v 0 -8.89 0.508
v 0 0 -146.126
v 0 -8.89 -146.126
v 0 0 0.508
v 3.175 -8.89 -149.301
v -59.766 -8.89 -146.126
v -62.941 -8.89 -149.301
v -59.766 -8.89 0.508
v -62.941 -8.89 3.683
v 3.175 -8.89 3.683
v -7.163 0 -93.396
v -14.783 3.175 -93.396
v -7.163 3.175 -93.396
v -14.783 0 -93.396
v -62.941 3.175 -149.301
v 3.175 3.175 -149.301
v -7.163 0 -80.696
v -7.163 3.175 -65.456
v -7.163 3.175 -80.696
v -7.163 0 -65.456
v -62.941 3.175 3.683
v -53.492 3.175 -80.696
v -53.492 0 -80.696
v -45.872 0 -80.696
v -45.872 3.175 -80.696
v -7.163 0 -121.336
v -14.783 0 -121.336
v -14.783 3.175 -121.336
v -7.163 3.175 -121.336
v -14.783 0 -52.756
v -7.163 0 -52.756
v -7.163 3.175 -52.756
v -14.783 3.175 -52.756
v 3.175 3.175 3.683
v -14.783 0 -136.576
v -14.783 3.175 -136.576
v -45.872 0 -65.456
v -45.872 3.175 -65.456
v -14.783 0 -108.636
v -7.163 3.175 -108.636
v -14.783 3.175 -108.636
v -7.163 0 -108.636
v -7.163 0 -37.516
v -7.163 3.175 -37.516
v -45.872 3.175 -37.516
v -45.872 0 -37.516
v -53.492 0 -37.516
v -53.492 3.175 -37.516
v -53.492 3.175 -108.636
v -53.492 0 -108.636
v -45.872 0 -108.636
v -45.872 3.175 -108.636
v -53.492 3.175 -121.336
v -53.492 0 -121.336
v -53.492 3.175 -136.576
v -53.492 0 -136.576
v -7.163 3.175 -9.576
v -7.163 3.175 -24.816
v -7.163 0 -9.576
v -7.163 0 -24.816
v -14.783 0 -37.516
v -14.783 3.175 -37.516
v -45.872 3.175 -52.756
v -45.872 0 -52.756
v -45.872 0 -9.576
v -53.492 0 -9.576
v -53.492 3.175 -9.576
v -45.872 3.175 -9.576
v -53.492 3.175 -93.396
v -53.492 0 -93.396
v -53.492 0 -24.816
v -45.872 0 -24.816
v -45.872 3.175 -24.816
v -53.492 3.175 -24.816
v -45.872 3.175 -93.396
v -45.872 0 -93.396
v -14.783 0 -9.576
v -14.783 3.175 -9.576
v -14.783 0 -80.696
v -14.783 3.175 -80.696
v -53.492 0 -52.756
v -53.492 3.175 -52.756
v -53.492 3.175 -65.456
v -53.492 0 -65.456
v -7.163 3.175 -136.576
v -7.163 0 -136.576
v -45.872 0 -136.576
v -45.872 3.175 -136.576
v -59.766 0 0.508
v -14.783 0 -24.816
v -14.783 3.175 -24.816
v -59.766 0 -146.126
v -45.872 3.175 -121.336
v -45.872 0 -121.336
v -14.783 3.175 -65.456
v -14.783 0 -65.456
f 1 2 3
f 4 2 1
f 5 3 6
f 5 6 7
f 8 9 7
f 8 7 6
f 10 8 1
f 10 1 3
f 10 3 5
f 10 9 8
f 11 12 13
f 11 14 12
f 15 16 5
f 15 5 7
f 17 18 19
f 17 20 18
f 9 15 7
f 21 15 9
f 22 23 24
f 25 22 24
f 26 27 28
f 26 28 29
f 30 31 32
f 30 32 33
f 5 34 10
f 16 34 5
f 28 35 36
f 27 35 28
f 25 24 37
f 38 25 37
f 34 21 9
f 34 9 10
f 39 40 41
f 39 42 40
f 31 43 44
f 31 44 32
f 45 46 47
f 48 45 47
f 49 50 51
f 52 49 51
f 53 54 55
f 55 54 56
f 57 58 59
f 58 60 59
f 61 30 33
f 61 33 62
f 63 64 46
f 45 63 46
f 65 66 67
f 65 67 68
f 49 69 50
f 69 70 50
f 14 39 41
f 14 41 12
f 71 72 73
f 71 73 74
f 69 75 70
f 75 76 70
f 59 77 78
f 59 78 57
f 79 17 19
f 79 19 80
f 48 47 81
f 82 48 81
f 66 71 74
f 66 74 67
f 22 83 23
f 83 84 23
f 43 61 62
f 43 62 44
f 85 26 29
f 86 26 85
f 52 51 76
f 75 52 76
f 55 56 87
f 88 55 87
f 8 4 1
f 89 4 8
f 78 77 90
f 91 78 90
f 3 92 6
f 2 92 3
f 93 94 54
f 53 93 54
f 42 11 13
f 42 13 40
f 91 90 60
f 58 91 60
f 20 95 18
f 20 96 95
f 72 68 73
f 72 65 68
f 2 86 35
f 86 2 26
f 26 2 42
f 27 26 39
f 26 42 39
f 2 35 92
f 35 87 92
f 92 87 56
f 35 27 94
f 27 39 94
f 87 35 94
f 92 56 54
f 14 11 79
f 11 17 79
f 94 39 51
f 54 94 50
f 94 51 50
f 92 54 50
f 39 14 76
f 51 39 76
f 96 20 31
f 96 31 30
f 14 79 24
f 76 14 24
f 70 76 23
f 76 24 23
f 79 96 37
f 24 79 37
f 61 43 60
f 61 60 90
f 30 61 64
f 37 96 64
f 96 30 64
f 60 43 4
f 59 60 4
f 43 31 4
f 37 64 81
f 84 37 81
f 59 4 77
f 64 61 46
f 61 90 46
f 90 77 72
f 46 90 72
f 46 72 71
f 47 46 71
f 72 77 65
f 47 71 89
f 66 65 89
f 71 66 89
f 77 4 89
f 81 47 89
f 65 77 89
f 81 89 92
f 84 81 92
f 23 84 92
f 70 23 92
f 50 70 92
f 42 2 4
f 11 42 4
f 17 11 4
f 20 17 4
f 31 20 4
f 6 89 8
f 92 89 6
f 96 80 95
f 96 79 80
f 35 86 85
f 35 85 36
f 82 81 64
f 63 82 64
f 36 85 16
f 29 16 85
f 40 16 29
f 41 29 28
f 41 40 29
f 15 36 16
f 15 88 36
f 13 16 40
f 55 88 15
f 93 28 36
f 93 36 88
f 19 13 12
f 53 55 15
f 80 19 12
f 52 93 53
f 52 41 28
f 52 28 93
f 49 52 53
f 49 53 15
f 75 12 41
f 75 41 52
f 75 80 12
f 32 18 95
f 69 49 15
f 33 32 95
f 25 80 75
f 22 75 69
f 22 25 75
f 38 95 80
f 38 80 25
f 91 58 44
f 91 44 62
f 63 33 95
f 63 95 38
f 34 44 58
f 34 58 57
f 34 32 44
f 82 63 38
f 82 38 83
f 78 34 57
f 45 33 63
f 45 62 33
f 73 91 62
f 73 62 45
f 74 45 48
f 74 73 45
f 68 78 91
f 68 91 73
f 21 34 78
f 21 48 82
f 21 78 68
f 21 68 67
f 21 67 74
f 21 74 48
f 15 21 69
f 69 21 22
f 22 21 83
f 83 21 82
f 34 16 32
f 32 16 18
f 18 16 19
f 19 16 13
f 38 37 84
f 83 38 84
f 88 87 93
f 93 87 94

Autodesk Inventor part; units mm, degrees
ref_plane "YZ Plane" through (0, 0, 0) normal (1, 0, 0) x (0, 1, 0)
ref_plane "XZ Plane" through (0, 0, 0) normal (0, 1, 0) x (-1, 0, 0)
ref_plane "XY Plane" through (0, 0, 0) normal (0, 0, 1) x (1, 0, 0)
sketch "Sketch4" plane through (0, 0, 0) normal (0, 1, 0) x (-1, 0, 0)
  line L0 (0, 0) -> (59.7662, 0)
  line L1 (59.7662, 0) -> (59.7662, -146.1262)
  line L2 (59.7662, -146.1262) -> (0, -146.1262)
  line L3 (0, -146.1262) -> (0, 0)
  line L4 (59.7662, 0) -> (53.4924, 0)
  line L5 (53.4924, 0) -> (53.4924, -9.5758)
  line L6 (53.4924, -9.5758) -> (59.7662, -9.5758)
  line L7 (59.7662, -9.5758) -> (59.7662, 0)
  line L8 (53.4924, -9.5758) -> (45.8724, -9.5758)
  line L9 (45.8724, -9.5758) -> (45.8724, -24.8158)
  line L10 (45.8724, -24.8158) -> (53.4924, -24.8158)
  line L11 (53.4924, -24.8158) -> (53.4924, -9.5758)
  line L12 (45.8724, -24.8158) -> (45.8724, -37.5158)
  line L13 (45.8724, -37.5158) -> (53.4924, -37.5158)
  line L14 (53.4924, -37.5158) -> (53.4924, -52.7558)
  line L15 (53.4924, -52.7558) -> (45.8724, -52.7558)
  line L16 (45.8724, -52.7558) -> (45.8724, -37.5158)
  line L17 (45.8724, -52.7558) -> (45.8724, -65.4558)
  line L18 (45.8724, -65.4558) -> (53.4924, -65.4558)
  line L19 (53.4924, -65.4558) -> (53.4924, -80.6958)
  line L20 (53.4924, -80.6958) -> (45.8724, -80.6958)
  line L21 (45.8724, -80.6958) -> (45.8724, -65.4558)
  line L22 (45.8724, -80.6958) -> (45.8724, -93.3958)
  line L23 (45.8724, -93.3958) -> (53.4924, -93.3958)
  line L24 (53.4924, -93.3958) -> (53.4924, -108.6358)
  line L25 (53.4924, -108.6358) -> (45.8724, -108.6358)
  line L26 (45.8724, -108.6358) -> (45.8724, -93.3958)
  line L27 (45.8724, -108.6358) -> (45.8724, -121.3358)
  line L28 (45.8724, -121.3358) -> (53.4924, -121.3358)
  line L29 (53.4924, -121.3358) -> (53.4924, -136.5758)
  line L30 (53.4924, -136.5758) -> (45.8724, -136.5758)
  line L31 (45.8724, -136.5758) -> (45.8724, -121.3358)
  line L32 (0, 0) -> (7.1628, 0)
  line L33 (7.1628, 0) -> (7.1628, -9.5758)
  line L34 (7.1628, -9.5758) -> (0, -9.5758)
  line L35 (0, -9.5758) -> (0, 0)
  line L36 (53.4924, -9.5758) -> (7.1628, -9.5758)
  line L37 (30.3276, -9.5758) -> (30.3276, -4.7879)
  line L38 (7.1628, -9.5758) -> (14.7828, -9.5758)
  line L39 (14.7828, -9.5758) -> (14.7828, -24.8158)
  line L40 (14.7828, -24.8158) -> (7.1628, -24.8158)
  line L41 (7.1628, -24.8158) -> (7.1628, -9.5758)
  line L42 (14.7828, -37.5158) -> (7.1628, -37.5158)
  line L43 (7.1628, -37.5158) -> (7.1628, -52.7558)
  line L44 (7.1628, -52.7558) -> (14.7828, -52.7558)
  line L45 (14.7828, -52.7558) -> (14.7828, -37.5158)
  line L46 (14.7828, -65.4558) -> (7.1628, -65.4558)
  line L47 (7.1628, -65.4558) -> (7.1628, -80.6958)
  line L48 (7.1628, -80.6958) -> (14.7828, -80.6958)
  line L49 (14.7828, -80.6958) -> (14.7828, -65.4558)
  line L50 (14.7828, -93.3958) -> (7.1628, -93.3958)
  line L51 (7.1628, -93.3958) -> (7.1628, -108.6358)
  line L52 (7.1628, -108.6358) -> (14.7828, -108.6358)
  line L53 (14.7828, -108.6358) -> (14.7828, -93.3958)
  line L54 (14.7828, -121.3358) -> (7.1628, -121.3358)
  line L55 (7.1628, -121.3358) -> (7.1628, -136.5758)
  line L56 (7.1628, -136.5758) -> (14.7828, -136.5758)
  line L57 (14.7828, -136.5758) -> (14.7828, -121.3358)
  line L58 (7.1628, -9.5758) -> (53.4924, -9.5758)
  line L59 (0, 0) -> (0, -146.1262)
  line L60 (0, -146.1262) -> (59.7662, -146.1262)
  line L61 (59.7662, -146.1262) -> (59.7662, 0)
  line L62 (62.9412, 0) -> (62.9412, -149.3012)
  line L63 (62.9412, -149.3012) -> (-3.175, -149.3012)
  line L64 (-3.175, -149.3012) -> (-3.175, 0)
  line L65 (0, 0.508) -> (59.7662, 0.508)
  line L66 (0, 3.683) -> (59.7662, 3.683)
  line L67 (62.9412, 0) -> (59.7662, 0)
  line L68 (59.7662, 0) -> (59.7662, 3.683)
  line L69 (59.7662, 3.683) -> (62.9412, 3.683)
  line L70 (62.9412, 3.683) -> (62.9412, 0)
  line L71 (-3.175, 0) -> (0, 0)
  line L72 (0, 0) -> (0, 3.683)
  line L73 (0, 3.683) -> (-3.175, 3.683)
  line L74 (-3.175, 3.683) -> (-3.175, 0)
  line L75 (0, 0.508) -> (0, 0.508)
  line L76 (0, 0.508) -> (0, 0)
  line L77 (0, 0) -> (0, 0)
  line L78 (0, 0) -> (0, 0.508)
  line L79 (59.7662, 0.508) -> (59.7662, 0.508)
  line L80 (59.7662, 0.508) -> (59.7662, 0)
  line L81 (59.7662, 0) -> (59.7662, 0)
  line L82 (59.7662, 0) -> (59.7662, 0.508)
  point P0 (59.7662, 0)
  dimension "d503" = 59.7662
  dimension "d504" = 146.1262
  dimension "d505" = 6.2738
  dimension "d506" = 9.5758
  dimension "d507" = 7.62
  dimension "d508" = 15.24
  dimension "d509" = 12.7
  dimension "d510" = 7.62
  dimension "d511" = 15.24
  dimension "d512" = 12.7
  dimension "d513" = 7.62
  dimension "d514" = 15.24
  dimension "d515" = 12.7
  dimension "d516" = 7.62
  dimension "d517" = 15.24
  dimension "d518" = 12.7
  dimension "d519" = 7.62
  dimension "d520" = 15.24
  dimension "d521" = 7.1628
  dimension "d522" = 9.5758
  dimension "d529" = 3.175
  dimension "d530" = 0.508
  dimension "d531" = 3.175
extrude "Extrusion4" add sketch "Sketch4" along normal blind 3.175 contours L72 L65 L68 L0 | L0 L33 L34 L3 | L3 L2 L1 L67 L62 L63 L64 L71 | L71 L74 L73 L72 | L0 L5 L8 L36 L33 | L34 L41 L40 L39 L36 L9 L10 L11 L6 L1 L2 L3 | L72 L66 L68 L65 | L0 L1 L6 L5 | L68 L69 L70 L67
sketch "Sketch5" plane through (0, 0, 0) normal (0, -1, 0) x (1, 0, 0)
  line L0 (-7.1628, -9.5758) -> (-14.7828, -9.5758) projected
  line L1 (-7.1628, -24.8158) -> (-7.1628, -9.5758) projected
  line L2 (-14.7828, -24.8158) -> (-7.1628, -24.8158) projected
  line L3 (-14.7828, -9.5758) -> (-14.7828, -24.8158) projected
  line L4 (-53.4924, -9.5758) -> (-53.4924, -24.8158) projected
  line L5 (-45.8724, -9.5758) -> (-53.4924, -9.5758) projected
  line L6 (-45.8724, -24.8158) -> (-45.8724, -9.5758) projected
  line L7 (-53.4924, -24.8158) -> (-45.8724, -24.8158) projected
  line L8 (-45.8724, -121.3358) -> (-53.4924, -121.3358) projected
  line L9 (-45.8724, -136.5758) -> (-45.8724, -121.3358) projected
  line L10 (-53.4924, -136.5758) -> (-45.8724, -136.5758) projected
  line L11 (-53.4924, -121.3358) -> (-53.4924, -136.5758) projected
  line L12 (-45.8724, -108.6358) -> (-45.8724, -93.3958) projected
  line L13 (-53.4924, -108.6358) -> (-45.8724, -108.6358) projected
  line L14 (-53.4924, -93.3958) -> (-53.4924, -108.6358) projected
  line L15 (-45.8724, -93.3958) -> (-53.4924, -93.3958) projected
  line L16 (-45.8724, -80.6958) -> (-45.8724, -65.4558) projected
  line L17 (-53.4924, -80.6958) -> (-45.8724, -80.6958) projected
  line L18 (-53.4924, -65.4558) -> (-53.4924, -80.6958) projected
  line L19 (-45.8724, -65.4558) -> (-53.4924, -65.4558) projected
  line L20 (-45.8724, -52.7558) -> (-45.8724, -37.5158) projected
  line L21 (-53.4924, -52.7558) -> (-45.8724, -52.7558) projected
  line L22 (-53.4924, -37.5158) -> (-53.4924, -52.7558) projected
  line L23 (-45.8724, -37.5158) -> (-53.4924, -37.5158) projected
  line L24 (-7.1628, -80.6958) -> (-7.1628, -65.4558) projected
  line L25 (-14.7828, -80.6958) -> (-7.1628, -80.6958) projected
  line L26 (-14.7828, -65.4558) -> (-14.7828, -80.6958) projected
  line L27 (-7.1628, -65.4558) -> (-14.7828, -65.4558) projected
  line L28 (-14.7828, -121.3358) -> (-14.7828, -136.5758) projected
  line L29 (-7.1628, -121.3358) -> (-14.7828, -121.3358) projected
  line L30 (-7.1628, -136.5758) -> (-7.1628, -121.3358) projected
  line L31 (-14.7828, -136.5758) -> (-7.1628, -136.5758) projected
  line L32 (-14.7828, -37.5158) -> (-14.7828, -52.7558) projected
  line L33 (-7.1628, -37.5158) -> (-14.7828, -37.5158) projected
  line L34 (-7.1628, -52.7558) -> (-7.1628, -37.5158) projected
  line L35 (-14.7828, -52.7558) -> (-7.1628, -52.7558) projected
  line L36 (-7.1628, -108.6358) -> (-7.1628, -93.3958) projected
  line L37 (-14.7828, -108.6358) -> (-7.1628, -108.6358) projected
  line L38 (-14.7828, -93.3958) -> (-14.7828, -108.6358) projected
  line L39 (-7.1628, -93.3958) -> (-14.7828, -93.3958) projected
  line L40 (-3.048, -3.048) -> (-3.048, -143.0782)
  line L41 (-3.048, -143.0782) -> (-56.7182, -143.0782)
  line L42 (-56.7182, -143.0782) -> (-56.7182, -3.048)
  line L43 (-56.7182, -3.048) -> (-3.048, -3.048)
  line L44 (-62.9412, 3.683) -> (3.175, 3.683) projected
  line L45 (3.175, 3.683) -> (3.175, -149.3012) projected
  line L46 (3.175, -149.3012) -> (-62.9412, -149.3012) projected
  line L47 (-62.9412, -149.3012) -> (-62.9412, 3.683) projected
  line L48 (0, 0.508) -> (-59.7662, 0.508)
  line L49 (-59.7662, 0.508) -> (-59.7662, -146.1262)
  line L50 (-59.7662, -146.1262) -> (0, -146.1262)
  line L51 (0, -146.1262) -> (0, 0.508)
  point P0 (0, 0)
  dimension "d532" = 3.175
extrude "Extrusion5" add sketch "Sketch5" along normal blind 8.89 contours L44 L45 L46 L47
properties part number "RelayCaseTop" material "Rubber, Silicone"
